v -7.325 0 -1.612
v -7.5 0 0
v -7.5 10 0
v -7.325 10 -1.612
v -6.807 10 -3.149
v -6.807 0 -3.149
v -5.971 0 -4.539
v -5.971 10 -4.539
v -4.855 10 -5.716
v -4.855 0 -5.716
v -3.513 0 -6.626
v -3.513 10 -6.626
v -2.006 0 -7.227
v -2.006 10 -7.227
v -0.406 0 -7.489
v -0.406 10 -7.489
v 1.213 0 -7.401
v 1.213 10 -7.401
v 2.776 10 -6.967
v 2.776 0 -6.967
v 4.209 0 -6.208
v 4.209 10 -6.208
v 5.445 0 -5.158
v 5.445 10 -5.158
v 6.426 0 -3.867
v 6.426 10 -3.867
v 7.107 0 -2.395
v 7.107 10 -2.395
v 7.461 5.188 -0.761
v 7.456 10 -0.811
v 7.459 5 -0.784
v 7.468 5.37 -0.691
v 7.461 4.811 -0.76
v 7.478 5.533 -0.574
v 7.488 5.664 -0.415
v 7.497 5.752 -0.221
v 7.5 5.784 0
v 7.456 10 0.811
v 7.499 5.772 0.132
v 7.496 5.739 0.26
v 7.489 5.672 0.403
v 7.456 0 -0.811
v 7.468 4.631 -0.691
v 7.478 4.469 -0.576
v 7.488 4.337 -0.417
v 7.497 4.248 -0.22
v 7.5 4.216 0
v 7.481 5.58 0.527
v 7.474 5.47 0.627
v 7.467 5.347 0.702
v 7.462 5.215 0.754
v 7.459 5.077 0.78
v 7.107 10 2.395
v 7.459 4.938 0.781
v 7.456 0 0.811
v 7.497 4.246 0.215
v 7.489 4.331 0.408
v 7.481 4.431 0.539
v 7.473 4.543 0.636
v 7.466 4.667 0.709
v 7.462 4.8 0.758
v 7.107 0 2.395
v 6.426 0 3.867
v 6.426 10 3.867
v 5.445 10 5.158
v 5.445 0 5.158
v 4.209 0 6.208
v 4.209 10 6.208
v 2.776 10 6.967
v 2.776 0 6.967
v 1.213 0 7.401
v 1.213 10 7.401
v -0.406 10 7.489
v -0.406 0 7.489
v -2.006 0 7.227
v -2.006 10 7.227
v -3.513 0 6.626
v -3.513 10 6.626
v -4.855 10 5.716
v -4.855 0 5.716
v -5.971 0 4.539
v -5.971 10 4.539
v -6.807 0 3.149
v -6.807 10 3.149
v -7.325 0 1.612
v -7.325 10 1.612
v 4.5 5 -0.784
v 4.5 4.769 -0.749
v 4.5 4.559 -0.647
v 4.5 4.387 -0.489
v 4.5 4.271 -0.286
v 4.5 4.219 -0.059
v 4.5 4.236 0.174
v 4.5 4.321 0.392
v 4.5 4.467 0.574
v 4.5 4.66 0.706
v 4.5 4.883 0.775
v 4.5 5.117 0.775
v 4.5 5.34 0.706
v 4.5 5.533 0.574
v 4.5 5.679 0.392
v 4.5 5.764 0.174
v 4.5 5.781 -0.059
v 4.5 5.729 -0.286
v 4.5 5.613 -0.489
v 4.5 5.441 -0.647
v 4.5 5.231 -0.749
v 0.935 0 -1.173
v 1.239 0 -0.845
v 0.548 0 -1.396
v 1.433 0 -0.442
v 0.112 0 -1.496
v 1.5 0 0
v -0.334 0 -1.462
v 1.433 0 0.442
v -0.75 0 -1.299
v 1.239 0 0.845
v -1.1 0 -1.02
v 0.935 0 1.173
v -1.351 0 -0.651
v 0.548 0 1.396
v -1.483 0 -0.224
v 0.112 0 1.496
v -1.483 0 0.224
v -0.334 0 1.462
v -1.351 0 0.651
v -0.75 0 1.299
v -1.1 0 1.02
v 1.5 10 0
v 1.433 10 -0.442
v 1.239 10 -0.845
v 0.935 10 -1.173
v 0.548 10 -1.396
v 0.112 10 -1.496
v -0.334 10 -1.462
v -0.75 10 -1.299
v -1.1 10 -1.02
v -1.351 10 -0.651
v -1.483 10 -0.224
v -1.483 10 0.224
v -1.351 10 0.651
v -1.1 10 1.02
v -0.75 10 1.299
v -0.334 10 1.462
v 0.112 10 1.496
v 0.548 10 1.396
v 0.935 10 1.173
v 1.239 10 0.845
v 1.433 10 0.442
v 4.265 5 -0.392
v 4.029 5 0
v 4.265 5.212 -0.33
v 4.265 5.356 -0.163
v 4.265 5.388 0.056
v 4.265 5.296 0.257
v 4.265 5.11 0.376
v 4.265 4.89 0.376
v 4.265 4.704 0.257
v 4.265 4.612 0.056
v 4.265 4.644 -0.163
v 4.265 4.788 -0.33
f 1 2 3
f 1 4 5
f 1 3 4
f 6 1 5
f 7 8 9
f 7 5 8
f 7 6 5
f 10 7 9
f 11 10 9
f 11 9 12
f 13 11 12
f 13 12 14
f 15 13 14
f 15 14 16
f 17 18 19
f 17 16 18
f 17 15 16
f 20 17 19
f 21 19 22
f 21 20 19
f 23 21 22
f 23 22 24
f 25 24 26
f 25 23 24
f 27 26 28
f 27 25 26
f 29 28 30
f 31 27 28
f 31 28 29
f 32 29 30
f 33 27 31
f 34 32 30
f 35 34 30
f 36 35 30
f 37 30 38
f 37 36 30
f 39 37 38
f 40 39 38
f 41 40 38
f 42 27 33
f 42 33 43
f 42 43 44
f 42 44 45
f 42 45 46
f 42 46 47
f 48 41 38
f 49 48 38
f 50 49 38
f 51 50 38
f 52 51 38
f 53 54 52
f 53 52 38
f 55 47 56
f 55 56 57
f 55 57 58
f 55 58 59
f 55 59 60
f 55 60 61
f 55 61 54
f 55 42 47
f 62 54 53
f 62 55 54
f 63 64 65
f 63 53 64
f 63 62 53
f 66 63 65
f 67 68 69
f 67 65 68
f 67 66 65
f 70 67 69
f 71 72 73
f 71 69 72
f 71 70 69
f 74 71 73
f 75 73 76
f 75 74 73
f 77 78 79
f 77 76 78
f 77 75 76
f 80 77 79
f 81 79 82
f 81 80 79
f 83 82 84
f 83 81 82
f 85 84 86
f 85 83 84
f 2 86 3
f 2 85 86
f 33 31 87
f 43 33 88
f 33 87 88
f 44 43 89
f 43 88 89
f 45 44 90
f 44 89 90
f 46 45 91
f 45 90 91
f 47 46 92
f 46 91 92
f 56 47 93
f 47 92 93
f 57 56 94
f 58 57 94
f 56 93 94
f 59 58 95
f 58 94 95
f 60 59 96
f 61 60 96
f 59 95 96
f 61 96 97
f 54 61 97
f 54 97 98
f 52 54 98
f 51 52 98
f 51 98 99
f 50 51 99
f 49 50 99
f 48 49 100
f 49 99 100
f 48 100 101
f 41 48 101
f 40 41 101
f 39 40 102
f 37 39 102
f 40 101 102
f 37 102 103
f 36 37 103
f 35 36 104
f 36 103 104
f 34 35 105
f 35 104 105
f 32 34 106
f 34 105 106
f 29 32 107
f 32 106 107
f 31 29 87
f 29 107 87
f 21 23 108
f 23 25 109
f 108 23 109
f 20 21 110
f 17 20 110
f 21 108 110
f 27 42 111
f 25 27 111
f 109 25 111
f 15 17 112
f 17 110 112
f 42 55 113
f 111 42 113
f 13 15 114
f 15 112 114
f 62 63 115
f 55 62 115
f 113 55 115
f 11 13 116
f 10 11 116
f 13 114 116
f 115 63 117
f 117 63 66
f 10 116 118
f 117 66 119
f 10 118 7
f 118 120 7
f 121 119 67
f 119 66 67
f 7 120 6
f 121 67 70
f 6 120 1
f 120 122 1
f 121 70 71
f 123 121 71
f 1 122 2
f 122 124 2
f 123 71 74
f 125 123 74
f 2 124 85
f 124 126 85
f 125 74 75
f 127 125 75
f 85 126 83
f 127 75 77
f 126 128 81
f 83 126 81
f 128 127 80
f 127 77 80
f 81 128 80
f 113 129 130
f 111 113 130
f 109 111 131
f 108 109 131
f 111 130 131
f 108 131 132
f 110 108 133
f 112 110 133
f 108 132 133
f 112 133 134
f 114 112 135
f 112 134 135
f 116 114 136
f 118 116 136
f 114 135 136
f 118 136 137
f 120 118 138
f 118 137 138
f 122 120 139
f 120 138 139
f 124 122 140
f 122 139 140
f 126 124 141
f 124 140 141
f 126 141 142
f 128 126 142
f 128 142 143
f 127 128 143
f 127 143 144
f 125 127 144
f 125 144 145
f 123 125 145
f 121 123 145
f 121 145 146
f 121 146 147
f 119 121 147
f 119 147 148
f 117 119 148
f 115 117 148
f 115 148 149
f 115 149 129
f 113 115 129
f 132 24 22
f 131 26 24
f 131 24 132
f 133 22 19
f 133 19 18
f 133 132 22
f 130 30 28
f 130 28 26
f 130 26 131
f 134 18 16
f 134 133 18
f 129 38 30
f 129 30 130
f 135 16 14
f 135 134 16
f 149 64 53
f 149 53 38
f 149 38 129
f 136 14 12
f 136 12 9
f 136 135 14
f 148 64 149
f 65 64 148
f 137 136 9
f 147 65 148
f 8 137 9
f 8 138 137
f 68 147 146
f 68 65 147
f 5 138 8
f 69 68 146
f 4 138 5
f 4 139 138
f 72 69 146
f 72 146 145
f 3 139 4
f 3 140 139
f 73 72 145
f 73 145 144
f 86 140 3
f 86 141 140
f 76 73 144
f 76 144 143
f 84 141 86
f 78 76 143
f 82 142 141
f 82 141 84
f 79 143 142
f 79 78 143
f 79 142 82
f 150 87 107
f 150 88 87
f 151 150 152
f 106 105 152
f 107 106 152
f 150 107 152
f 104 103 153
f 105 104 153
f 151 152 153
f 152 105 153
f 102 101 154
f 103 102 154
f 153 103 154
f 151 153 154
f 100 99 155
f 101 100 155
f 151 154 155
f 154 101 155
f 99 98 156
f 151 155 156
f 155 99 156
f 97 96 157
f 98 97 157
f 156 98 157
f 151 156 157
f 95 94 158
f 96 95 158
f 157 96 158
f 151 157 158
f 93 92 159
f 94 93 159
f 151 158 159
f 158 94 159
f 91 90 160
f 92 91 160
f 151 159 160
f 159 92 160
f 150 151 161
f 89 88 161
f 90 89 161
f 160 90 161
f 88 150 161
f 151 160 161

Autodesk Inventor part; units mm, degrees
ref_plane "XZ Plane" through (0, 0, 0) normal (0, 1, 0) x (-1, 0, 0)
ref_plane "XY Plane" through (0, 0, 0) normal (0, 0, 1) x (1, 0, 0)
sketch "草图1" plane through (0, 0, 0) normal (0, 1, 0) x (-1, 0, 0)
  circle A0 centre (0, 0) radius 7.5
  dimension "d0" = 15
extrude "拉伸1" add sketch "草图1" along normal blind 10
sketch "草图2" plane through (0, 10, 0) normal (0, 1, 0) x (1, 0, 0)
  circle A0 centre (0, 0) radius 1.5
  circle A1 centre (0, 0) radius 7.5 projected
  dimension "d3" = 3
  dimension "d4" = 0
  dimension "d5" = 0
extrude "拉伸2" cut sketch "草图2" against normal blind 10 contours A0
sketch "草图3" plane through (0, 0, 0) normal (0, -1, 0) x (1, 0, 0)
  point P0 (0, 0)
ref_plane "工作平面1" through (7.5, 0, 0) normal (1, 0, 0) x (0, 1, 0)
sketch "草图4" plane through (7.5, 0, 0) normal (1, 0, 0) x (0, 1, 0)
  line L0 (0, -7.5) -> (0, 7.5) projected
  line L1 (10, -7.5) -> (10, 7.5) projected
  line L2 (0, 7.5) -> (10, 7.5) projected
  line L3 (0, -7.5) -> (10, -7.5) projected
  point P0 (0, 0)
sketch "草图5" plane through (7.5, 0, 0) normal (1, 0, 0) x (0, 1, 0)
  line L0 (10, -7.5) -> (10, 7.5) projected
  point P0 (0, 0)
  point P1 (5, 0)
  dimension "d8" = 5
hole "孔1" at (7.5, 5, 0) direction (-1, 0, 0) diameter 1.567 depth 3 tip angle 118 thread size "M2x0.4" class "6H" standard "ISO Metric profile"
properties part number "微型联轴器"
